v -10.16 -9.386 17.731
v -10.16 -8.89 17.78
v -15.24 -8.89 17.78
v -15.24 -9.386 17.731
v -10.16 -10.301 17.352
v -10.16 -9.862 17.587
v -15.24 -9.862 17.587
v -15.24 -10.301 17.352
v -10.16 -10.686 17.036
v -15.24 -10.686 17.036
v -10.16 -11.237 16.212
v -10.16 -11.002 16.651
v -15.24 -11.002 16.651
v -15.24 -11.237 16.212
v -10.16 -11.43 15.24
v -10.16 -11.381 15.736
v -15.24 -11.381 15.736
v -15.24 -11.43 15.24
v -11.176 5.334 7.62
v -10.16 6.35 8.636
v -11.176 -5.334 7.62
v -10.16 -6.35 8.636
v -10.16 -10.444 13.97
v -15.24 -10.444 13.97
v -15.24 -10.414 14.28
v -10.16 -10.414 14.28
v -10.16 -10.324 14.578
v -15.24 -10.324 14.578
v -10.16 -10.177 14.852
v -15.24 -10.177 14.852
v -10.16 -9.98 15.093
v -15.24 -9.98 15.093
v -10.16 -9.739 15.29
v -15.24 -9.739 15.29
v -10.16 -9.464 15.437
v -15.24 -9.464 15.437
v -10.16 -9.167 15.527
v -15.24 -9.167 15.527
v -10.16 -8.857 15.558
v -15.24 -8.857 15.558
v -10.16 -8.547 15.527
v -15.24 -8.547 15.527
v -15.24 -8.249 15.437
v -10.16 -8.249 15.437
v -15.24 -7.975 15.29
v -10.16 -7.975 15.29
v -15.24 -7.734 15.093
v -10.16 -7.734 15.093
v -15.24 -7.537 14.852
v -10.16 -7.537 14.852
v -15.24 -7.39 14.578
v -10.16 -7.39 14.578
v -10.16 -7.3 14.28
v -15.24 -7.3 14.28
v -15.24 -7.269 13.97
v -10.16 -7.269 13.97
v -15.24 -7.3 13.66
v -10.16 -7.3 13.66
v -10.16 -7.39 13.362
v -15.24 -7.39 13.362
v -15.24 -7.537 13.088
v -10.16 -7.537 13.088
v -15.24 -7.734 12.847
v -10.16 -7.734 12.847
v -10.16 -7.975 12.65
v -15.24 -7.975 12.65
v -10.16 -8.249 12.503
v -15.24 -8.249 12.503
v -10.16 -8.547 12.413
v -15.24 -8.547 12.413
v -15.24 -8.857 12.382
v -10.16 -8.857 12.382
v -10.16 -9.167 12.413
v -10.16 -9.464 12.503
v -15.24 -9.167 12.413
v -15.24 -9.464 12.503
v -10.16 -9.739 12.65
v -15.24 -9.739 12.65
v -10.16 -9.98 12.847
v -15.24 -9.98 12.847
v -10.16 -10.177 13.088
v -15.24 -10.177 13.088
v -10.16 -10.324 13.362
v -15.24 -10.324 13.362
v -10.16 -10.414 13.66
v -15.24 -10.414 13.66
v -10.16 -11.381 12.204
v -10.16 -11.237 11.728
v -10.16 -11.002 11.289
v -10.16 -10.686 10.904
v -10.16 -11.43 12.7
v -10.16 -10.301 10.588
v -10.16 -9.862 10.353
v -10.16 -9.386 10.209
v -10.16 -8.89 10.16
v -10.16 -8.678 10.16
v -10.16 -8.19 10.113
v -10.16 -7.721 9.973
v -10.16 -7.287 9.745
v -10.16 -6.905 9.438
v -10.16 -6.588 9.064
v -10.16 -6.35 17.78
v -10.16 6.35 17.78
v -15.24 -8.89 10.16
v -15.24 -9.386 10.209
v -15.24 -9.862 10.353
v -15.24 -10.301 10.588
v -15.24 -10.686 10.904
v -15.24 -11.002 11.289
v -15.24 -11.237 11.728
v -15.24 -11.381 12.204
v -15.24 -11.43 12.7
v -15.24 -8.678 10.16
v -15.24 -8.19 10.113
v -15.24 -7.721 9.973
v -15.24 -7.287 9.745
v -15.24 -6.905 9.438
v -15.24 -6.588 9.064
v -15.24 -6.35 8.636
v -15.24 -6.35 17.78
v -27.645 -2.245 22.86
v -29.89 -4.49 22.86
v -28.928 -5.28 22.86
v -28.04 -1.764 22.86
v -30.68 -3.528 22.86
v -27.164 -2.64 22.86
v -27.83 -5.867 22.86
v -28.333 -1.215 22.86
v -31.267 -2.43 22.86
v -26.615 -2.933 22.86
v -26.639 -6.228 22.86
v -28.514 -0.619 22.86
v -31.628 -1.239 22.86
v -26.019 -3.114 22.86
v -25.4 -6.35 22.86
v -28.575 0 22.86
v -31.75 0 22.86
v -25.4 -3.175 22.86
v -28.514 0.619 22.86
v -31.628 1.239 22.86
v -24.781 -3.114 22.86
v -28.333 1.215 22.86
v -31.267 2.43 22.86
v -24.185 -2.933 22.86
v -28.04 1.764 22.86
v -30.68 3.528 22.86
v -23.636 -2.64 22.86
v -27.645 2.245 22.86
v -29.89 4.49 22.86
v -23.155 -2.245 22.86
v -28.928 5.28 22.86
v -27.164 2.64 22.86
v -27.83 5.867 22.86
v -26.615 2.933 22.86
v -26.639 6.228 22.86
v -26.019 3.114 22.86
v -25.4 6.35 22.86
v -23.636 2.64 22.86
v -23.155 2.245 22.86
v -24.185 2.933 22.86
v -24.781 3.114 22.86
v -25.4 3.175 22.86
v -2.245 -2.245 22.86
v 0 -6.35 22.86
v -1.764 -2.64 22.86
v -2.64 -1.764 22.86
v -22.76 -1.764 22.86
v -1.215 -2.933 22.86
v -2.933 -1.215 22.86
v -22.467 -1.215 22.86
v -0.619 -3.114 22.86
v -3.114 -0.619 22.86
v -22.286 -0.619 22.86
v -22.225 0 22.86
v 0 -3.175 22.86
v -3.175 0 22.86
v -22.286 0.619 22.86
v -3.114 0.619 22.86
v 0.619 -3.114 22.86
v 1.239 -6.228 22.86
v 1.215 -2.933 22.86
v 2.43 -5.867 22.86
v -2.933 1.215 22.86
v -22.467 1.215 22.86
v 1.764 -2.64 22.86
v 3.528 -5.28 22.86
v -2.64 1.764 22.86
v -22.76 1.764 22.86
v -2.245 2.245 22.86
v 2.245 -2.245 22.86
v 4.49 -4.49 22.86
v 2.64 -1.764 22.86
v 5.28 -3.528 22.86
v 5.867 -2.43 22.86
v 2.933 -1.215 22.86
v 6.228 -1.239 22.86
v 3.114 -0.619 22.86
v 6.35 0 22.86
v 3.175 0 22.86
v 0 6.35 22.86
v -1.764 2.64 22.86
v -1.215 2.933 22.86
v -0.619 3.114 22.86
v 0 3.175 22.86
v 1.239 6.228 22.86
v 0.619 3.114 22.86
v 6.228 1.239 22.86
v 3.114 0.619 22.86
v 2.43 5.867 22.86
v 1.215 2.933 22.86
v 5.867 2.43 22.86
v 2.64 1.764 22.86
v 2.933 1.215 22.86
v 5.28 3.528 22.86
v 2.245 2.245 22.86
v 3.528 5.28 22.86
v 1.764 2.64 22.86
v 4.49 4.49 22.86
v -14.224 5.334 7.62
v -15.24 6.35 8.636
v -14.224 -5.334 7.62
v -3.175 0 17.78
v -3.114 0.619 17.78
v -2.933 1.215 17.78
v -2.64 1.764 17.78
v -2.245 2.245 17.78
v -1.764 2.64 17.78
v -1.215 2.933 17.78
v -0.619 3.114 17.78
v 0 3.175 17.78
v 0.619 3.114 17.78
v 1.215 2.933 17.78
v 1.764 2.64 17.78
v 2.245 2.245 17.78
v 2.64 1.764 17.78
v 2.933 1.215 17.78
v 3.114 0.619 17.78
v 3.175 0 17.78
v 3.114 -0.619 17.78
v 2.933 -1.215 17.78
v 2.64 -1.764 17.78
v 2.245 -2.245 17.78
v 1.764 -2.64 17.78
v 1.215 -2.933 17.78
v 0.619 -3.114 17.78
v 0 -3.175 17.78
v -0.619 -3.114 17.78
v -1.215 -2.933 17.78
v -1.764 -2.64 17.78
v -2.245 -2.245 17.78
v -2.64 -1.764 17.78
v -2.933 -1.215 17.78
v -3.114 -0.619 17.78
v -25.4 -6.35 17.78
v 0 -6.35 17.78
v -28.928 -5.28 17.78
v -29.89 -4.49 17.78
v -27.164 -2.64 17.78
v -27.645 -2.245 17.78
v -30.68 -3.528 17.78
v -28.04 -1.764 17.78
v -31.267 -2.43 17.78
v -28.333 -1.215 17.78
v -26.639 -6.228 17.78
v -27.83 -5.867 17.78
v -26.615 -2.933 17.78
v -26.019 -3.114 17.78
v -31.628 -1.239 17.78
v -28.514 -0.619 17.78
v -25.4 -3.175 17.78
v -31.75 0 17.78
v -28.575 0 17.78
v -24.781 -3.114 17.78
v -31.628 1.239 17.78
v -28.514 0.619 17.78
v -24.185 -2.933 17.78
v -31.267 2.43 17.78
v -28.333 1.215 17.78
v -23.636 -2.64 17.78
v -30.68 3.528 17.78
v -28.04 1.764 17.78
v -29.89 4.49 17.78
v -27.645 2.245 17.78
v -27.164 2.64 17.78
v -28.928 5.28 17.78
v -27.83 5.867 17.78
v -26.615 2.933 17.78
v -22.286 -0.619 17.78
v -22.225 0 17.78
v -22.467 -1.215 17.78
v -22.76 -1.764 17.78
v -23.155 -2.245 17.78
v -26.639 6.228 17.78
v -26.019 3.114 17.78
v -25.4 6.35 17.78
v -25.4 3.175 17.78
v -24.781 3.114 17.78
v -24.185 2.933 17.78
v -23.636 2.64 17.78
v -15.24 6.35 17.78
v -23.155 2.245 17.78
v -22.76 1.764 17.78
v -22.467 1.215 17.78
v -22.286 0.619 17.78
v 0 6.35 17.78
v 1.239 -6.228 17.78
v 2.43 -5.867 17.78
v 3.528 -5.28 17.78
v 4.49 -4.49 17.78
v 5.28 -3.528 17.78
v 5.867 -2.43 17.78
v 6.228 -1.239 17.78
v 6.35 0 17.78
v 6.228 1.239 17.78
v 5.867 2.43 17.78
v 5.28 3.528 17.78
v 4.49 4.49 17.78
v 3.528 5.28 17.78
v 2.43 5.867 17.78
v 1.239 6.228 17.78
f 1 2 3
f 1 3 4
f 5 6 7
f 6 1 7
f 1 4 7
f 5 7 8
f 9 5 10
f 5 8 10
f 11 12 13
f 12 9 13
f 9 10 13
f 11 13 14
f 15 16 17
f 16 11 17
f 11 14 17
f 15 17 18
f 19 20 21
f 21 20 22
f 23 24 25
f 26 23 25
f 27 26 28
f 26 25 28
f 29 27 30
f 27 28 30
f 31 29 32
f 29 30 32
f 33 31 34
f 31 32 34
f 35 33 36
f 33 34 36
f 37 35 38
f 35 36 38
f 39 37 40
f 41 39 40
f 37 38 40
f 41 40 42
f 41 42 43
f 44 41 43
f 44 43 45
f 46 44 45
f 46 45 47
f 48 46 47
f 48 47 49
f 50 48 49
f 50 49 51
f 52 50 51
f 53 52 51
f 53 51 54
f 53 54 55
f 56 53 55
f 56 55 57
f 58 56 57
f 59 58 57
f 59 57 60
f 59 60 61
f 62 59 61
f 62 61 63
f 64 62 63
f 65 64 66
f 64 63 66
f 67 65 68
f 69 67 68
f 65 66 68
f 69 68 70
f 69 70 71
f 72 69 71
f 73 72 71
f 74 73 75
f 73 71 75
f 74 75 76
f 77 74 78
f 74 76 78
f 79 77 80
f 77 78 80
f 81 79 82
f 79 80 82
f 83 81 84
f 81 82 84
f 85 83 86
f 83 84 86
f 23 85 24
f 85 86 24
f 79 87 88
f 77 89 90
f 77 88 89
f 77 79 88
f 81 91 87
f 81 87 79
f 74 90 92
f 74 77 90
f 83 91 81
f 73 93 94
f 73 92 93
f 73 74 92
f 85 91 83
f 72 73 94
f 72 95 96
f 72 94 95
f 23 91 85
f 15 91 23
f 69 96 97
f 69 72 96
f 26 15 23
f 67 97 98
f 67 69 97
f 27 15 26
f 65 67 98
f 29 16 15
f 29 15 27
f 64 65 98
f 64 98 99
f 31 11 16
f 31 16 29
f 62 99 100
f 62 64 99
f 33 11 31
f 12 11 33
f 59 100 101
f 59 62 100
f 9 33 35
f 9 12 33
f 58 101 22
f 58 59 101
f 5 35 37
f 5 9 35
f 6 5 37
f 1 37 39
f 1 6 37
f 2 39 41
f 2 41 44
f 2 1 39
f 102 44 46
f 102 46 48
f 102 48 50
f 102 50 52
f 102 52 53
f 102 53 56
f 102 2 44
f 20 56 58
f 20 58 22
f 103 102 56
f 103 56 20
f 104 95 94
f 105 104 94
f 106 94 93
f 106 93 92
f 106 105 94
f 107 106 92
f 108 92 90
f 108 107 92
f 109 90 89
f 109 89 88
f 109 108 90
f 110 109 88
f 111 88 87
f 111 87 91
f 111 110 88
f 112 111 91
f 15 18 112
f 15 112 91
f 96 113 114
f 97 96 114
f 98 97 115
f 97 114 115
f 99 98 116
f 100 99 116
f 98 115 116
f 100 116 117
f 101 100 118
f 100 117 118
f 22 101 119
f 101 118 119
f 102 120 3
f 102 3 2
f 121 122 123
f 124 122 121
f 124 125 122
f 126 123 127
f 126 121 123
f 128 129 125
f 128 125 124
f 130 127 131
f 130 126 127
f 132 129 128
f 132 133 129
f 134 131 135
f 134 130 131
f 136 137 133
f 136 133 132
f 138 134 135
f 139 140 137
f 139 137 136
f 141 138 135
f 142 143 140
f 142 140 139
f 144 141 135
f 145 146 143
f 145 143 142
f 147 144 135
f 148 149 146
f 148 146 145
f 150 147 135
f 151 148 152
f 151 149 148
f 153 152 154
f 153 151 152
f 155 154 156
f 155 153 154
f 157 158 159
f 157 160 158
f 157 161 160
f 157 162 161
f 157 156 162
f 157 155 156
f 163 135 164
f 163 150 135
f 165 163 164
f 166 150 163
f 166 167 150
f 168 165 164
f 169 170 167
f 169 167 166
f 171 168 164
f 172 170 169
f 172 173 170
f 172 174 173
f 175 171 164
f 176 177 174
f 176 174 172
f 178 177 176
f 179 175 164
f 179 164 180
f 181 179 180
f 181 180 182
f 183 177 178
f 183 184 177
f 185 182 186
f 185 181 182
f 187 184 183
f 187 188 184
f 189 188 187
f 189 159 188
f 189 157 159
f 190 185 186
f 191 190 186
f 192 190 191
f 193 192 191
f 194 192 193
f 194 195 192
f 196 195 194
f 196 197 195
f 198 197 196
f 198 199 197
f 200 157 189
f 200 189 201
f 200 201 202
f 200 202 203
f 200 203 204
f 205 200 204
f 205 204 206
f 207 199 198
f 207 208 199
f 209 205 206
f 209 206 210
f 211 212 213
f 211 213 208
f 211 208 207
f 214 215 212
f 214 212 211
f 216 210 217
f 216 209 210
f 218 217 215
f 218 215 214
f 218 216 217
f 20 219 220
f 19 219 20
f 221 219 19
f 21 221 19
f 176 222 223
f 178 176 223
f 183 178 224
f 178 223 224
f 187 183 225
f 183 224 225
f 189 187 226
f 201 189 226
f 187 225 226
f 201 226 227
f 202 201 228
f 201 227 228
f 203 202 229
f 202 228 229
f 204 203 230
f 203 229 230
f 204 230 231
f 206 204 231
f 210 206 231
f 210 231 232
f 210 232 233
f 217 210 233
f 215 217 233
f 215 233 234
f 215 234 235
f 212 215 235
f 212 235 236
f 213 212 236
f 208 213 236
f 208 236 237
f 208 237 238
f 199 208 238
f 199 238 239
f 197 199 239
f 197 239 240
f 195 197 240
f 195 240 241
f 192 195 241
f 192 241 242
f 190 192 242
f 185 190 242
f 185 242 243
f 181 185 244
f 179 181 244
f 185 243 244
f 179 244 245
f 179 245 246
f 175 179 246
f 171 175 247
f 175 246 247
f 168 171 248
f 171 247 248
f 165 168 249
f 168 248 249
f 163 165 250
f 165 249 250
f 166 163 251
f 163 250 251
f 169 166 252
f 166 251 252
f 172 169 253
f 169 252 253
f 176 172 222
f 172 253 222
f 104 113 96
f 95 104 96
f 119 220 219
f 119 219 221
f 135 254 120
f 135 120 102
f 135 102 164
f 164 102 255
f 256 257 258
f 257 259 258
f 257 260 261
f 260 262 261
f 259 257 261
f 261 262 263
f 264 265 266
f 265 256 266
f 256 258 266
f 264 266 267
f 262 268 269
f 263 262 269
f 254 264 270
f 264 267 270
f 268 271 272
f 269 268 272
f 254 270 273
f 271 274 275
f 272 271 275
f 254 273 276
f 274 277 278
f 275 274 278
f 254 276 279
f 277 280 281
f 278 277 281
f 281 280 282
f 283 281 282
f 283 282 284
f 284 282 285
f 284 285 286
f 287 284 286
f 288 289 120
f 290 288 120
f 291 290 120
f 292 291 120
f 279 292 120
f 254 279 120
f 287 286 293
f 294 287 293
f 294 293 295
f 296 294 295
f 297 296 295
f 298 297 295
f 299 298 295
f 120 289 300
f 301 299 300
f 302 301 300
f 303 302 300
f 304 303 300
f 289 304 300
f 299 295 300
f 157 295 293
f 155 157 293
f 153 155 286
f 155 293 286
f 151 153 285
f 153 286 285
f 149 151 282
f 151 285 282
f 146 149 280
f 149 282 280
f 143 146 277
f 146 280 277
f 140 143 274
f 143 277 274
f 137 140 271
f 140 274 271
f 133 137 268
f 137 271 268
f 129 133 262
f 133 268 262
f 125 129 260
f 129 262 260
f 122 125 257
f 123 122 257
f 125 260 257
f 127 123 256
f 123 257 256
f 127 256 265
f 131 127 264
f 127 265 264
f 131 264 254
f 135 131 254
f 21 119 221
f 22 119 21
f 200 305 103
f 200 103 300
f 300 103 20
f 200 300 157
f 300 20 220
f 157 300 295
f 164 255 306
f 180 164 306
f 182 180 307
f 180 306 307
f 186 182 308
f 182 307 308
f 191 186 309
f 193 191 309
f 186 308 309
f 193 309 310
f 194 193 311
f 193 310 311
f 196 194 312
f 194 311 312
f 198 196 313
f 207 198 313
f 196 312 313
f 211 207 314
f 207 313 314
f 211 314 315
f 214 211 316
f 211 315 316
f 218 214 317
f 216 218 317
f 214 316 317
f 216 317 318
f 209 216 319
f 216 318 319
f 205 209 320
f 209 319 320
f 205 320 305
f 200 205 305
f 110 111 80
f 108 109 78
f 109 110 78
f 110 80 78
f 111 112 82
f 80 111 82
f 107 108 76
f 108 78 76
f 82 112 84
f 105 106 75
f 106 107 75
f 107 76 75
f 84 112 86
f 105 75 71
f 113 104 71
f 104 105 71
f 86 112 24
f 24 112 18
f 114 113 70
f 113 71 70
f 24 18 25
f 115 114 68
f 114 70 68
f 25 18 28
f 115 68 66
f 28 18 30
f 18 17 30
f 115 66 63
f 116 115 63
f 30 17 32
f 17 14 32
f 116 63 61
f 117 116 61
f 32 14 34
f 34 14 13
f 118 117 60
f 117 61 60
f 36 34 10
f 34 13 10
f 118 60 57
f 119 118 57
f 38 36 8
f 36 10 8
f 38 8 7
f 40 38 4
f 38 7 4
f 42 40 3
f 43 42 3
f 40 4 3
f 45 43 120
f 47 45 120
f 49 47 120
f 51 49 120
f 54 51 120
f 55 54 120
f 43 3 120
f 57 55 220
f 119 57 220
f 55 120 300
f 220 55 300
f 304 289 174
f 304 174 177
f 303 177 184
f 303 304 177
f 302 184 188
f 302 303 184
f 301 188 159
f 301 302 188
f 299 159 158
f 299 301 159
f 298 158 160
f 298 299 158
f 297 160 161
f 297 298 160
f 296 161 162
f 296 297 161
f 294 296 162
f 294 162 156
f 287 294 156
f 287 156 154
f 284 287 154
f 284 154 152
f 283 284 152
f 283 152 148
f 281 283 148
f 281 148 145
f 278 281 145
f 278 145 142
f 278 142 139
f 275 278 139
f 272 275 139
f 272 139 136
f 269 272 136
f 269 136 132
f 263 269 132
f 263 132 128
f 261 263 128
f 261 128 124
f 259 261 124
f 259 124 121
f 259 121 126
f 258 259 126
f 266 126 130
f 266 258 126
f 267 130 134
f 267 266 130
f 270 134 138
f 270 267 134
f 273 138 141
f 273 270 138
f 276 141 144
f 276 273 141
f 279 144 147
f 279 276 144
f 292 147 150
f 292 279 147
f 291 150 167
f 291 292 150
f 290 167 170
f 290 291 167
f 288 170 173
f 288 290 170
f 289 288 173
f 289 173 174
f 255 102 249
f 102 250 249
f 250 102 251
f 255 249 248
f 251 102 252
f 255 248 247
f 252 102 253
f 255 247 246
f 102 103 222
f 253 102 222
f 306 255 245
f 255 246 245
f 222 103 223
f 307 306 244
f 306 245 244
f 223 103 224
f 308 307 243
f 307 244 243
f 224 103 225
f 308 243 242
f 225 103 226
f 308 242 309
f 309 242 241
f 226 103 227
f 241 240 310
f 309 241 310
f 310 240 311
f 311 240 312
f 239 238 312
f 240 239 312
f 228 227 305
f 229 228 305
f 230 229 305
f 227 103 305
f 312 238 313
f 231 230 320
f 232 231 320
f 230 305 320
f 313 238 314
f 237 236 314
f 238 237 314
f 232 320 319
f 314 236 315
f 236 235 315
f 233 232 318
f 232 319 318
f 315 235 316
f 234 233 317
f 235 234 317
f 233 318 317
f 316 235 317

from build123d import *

# Parameters (mm, degrees)
F0_R         = 3.175
F1_DEPTH     = 22.86
F2_W         = 6.35
F2_H         = 6.35
F2_W_2       = 6.7925655007
F3_DEPTH     = 25.4
F5_DEPTH     = 25.4
F6_SIZE      = 1.016
F7_W         = 5.08
F7_H         = 7.62
F8_DEPTH     = 5.08
F9_R         = 1.5875
F10_DEPTH    = 25.4
F11_T1_DEPTH = 5.08
F11_T3_DEPTH = 17.78
F11_T5_DEPTH = 17.78


# Not quite as in the source:
# - a fillet or chamfer that OpenCascade refuses, or shapes differently, is made with other operations: its cross-section is extruded or revolved along the edge and cut away or added


with BuildPart() as f1:
    # F0 (on Top) → F1 (new body)
    with BuildSketch(Plane.XY):
        with BuildLine():
            Line((0, 6.35), (-25.4, 6.35))
            ThreePointArc((-25.4, 6.35), (-31.75, 0), (-25.4, -6.35))
            Line((-25.4, -6.35), (0, -6.35))
            ThreePointArc((0, -6.35), (6.35, 0), (0, 6.35))
        make_face()
        with Locations((-25.4, 0)):
            Circle(F0_R, mode=Mode.SUBTRACT)
        with BuildLine():
            ThreePointArc((3.175, 0), (0, -3.175), (-3.175, 0))
            ThreePointArc((-3.175, 0), (0, 3.175), (3.175, 0))
        make_face(mode=Mode.SUBTRACT)
    extrude(amount=F1_DEPTH)

    # F2 (on face) → F3 (cut)
    with BuildSketch(Plane(origin=(0, 6.35, 0), x_dir=(-1, 0, 0), z_dir=(0, 1, 0))):
        with Locations((-3.175, 8.255)):
            Rectangle(F2_W, F2_H)
        with Locations((28.7962827504, 14.605)):
            Rectangle(F2_W_2, F2_H)
        with Locations((28.7962827504, 8.255)):
            Rectangle(F2_W_2, F2_H)
        with Locations((3.175, 8.255)):
            Rectangle(F2_W, F2_H)
        with Locations((3.175, 14.605)):
            Rectangle(F2_W, F2_H)
        with Locations((22.225, 14.605)):
            Rectangle(F2_W, F2_H)
        with Locations((22.225, 8.255)):
            Rectangle(F2_W, F2_H)
        with Locations((-3.175, 14.605)):
            Rectangle(F2_W, F2_H)
    extrude(amount=-F3_DEPTH, mode=Mode.SUBTRACT)

    # F4 (on face) → F5 (cut)
    with BuildSketch(Plane(origin=(0, 6.35, 0), x_dir=(-1, 0, 0), z_dir=(0, 1, 0))):
        Polygon((10.16, 17.78), (6.35, 17.78), (-14.3396928906, 11.8959285319), (-15.9743130207, -5.6489794515), (34.4809181988, -5.6489794515), (40.5834950507, 3.3959113061), (19.05, 17.78), (15.24, 17.78), (15.24, 7.62), (10.16, 7.62), align=None)
    extrude(amount=-F5_DEPTH, mode=Mode.SUBTRACT)

    # F6
    f6_edges = [f1.edges().sort_by_distance(p)[0] for p in [
        (-15.24, 0, 7.62),
        (-10.16, 0, 7.62),
        (-12.7, -6.35, 7.62),
        (-12.7, 6.35, 7.62),
    ]]
    chamfer(f6_edges, length=F6_SIZE)

    # F7 (on face) → F8 (join)
    with BuildSketch(Plane.XZ.offset(6.35)):
        with Locations((-12.7, 13.97)):
            Rectangle(F7_W, F7_H)
    extrude(amount=F8_DEPTH)

    # F9 (on face) → F10 (cut)
    with BuildSketch(Plane(origin=(-15.24, 0, 0), x_dir=(0, -1, 0), z_dir=(-1, 0, 0))):
        with Locations((8.8569838554, 13.97)):
            Circle(F9_R)
    extrude(amount=-F10_DEPTH, mode=Mode.SUBTRACT)

    # F11: fillet of radius 2.54 on 3 edges, made by hand

    # F11_s2 → F11_t1 (join)
    with BuildSketch(Plane.YZ.offset(-15.24)):
        with BuildLine():
            ThreePointArc((-8.677948453, 10.16), (-7.286733157, 9.7451164674), (-6.35, 8.636))
            Line((-6.35, 8.636), (-6.35, 10.16))
            Line((-6.35, 10.16), (-8.677948453, 10.16))
        make_face()
    extrude(amount=F11_T1_DEPTH)

    # F11_s4 → F11_t3 (cut)
    with BuildSketch(Plane.YZ.offset(-21.59)):
        with BuildLine():
            ThreePointArc((-8.89, 17.78), (-10.6860512242, 17.0360512242), (-11.43, 15.24))
            Line((-11.43, 15.24), (-11.43, 17.78))
            Line((-11.43, 17.78), (-8.89, 17.78))
        make_face()
    extrude(amount=F11_T3_DEPTH, mode=Mode.SUBTRACT)

    # F11_s6 → F11_t5 (cut)
    with BuildSketch(Plane.YZ.offset(-21.59)):
        with BuildLine():
            ThreePointArc((-8.89, 10.16), (-10.6860512242, 10.9039487758), (-11.43, 12.7))
            Line((-11.43, 12.7), (-11.43, 10.16))
            Line((-11.43, 10.16), (-8.89, 10.16))
        make_face()
    extrude(amount=F11_T5_DEPTH, mode=Mode.SUBTRACT)


solid = f1.part
